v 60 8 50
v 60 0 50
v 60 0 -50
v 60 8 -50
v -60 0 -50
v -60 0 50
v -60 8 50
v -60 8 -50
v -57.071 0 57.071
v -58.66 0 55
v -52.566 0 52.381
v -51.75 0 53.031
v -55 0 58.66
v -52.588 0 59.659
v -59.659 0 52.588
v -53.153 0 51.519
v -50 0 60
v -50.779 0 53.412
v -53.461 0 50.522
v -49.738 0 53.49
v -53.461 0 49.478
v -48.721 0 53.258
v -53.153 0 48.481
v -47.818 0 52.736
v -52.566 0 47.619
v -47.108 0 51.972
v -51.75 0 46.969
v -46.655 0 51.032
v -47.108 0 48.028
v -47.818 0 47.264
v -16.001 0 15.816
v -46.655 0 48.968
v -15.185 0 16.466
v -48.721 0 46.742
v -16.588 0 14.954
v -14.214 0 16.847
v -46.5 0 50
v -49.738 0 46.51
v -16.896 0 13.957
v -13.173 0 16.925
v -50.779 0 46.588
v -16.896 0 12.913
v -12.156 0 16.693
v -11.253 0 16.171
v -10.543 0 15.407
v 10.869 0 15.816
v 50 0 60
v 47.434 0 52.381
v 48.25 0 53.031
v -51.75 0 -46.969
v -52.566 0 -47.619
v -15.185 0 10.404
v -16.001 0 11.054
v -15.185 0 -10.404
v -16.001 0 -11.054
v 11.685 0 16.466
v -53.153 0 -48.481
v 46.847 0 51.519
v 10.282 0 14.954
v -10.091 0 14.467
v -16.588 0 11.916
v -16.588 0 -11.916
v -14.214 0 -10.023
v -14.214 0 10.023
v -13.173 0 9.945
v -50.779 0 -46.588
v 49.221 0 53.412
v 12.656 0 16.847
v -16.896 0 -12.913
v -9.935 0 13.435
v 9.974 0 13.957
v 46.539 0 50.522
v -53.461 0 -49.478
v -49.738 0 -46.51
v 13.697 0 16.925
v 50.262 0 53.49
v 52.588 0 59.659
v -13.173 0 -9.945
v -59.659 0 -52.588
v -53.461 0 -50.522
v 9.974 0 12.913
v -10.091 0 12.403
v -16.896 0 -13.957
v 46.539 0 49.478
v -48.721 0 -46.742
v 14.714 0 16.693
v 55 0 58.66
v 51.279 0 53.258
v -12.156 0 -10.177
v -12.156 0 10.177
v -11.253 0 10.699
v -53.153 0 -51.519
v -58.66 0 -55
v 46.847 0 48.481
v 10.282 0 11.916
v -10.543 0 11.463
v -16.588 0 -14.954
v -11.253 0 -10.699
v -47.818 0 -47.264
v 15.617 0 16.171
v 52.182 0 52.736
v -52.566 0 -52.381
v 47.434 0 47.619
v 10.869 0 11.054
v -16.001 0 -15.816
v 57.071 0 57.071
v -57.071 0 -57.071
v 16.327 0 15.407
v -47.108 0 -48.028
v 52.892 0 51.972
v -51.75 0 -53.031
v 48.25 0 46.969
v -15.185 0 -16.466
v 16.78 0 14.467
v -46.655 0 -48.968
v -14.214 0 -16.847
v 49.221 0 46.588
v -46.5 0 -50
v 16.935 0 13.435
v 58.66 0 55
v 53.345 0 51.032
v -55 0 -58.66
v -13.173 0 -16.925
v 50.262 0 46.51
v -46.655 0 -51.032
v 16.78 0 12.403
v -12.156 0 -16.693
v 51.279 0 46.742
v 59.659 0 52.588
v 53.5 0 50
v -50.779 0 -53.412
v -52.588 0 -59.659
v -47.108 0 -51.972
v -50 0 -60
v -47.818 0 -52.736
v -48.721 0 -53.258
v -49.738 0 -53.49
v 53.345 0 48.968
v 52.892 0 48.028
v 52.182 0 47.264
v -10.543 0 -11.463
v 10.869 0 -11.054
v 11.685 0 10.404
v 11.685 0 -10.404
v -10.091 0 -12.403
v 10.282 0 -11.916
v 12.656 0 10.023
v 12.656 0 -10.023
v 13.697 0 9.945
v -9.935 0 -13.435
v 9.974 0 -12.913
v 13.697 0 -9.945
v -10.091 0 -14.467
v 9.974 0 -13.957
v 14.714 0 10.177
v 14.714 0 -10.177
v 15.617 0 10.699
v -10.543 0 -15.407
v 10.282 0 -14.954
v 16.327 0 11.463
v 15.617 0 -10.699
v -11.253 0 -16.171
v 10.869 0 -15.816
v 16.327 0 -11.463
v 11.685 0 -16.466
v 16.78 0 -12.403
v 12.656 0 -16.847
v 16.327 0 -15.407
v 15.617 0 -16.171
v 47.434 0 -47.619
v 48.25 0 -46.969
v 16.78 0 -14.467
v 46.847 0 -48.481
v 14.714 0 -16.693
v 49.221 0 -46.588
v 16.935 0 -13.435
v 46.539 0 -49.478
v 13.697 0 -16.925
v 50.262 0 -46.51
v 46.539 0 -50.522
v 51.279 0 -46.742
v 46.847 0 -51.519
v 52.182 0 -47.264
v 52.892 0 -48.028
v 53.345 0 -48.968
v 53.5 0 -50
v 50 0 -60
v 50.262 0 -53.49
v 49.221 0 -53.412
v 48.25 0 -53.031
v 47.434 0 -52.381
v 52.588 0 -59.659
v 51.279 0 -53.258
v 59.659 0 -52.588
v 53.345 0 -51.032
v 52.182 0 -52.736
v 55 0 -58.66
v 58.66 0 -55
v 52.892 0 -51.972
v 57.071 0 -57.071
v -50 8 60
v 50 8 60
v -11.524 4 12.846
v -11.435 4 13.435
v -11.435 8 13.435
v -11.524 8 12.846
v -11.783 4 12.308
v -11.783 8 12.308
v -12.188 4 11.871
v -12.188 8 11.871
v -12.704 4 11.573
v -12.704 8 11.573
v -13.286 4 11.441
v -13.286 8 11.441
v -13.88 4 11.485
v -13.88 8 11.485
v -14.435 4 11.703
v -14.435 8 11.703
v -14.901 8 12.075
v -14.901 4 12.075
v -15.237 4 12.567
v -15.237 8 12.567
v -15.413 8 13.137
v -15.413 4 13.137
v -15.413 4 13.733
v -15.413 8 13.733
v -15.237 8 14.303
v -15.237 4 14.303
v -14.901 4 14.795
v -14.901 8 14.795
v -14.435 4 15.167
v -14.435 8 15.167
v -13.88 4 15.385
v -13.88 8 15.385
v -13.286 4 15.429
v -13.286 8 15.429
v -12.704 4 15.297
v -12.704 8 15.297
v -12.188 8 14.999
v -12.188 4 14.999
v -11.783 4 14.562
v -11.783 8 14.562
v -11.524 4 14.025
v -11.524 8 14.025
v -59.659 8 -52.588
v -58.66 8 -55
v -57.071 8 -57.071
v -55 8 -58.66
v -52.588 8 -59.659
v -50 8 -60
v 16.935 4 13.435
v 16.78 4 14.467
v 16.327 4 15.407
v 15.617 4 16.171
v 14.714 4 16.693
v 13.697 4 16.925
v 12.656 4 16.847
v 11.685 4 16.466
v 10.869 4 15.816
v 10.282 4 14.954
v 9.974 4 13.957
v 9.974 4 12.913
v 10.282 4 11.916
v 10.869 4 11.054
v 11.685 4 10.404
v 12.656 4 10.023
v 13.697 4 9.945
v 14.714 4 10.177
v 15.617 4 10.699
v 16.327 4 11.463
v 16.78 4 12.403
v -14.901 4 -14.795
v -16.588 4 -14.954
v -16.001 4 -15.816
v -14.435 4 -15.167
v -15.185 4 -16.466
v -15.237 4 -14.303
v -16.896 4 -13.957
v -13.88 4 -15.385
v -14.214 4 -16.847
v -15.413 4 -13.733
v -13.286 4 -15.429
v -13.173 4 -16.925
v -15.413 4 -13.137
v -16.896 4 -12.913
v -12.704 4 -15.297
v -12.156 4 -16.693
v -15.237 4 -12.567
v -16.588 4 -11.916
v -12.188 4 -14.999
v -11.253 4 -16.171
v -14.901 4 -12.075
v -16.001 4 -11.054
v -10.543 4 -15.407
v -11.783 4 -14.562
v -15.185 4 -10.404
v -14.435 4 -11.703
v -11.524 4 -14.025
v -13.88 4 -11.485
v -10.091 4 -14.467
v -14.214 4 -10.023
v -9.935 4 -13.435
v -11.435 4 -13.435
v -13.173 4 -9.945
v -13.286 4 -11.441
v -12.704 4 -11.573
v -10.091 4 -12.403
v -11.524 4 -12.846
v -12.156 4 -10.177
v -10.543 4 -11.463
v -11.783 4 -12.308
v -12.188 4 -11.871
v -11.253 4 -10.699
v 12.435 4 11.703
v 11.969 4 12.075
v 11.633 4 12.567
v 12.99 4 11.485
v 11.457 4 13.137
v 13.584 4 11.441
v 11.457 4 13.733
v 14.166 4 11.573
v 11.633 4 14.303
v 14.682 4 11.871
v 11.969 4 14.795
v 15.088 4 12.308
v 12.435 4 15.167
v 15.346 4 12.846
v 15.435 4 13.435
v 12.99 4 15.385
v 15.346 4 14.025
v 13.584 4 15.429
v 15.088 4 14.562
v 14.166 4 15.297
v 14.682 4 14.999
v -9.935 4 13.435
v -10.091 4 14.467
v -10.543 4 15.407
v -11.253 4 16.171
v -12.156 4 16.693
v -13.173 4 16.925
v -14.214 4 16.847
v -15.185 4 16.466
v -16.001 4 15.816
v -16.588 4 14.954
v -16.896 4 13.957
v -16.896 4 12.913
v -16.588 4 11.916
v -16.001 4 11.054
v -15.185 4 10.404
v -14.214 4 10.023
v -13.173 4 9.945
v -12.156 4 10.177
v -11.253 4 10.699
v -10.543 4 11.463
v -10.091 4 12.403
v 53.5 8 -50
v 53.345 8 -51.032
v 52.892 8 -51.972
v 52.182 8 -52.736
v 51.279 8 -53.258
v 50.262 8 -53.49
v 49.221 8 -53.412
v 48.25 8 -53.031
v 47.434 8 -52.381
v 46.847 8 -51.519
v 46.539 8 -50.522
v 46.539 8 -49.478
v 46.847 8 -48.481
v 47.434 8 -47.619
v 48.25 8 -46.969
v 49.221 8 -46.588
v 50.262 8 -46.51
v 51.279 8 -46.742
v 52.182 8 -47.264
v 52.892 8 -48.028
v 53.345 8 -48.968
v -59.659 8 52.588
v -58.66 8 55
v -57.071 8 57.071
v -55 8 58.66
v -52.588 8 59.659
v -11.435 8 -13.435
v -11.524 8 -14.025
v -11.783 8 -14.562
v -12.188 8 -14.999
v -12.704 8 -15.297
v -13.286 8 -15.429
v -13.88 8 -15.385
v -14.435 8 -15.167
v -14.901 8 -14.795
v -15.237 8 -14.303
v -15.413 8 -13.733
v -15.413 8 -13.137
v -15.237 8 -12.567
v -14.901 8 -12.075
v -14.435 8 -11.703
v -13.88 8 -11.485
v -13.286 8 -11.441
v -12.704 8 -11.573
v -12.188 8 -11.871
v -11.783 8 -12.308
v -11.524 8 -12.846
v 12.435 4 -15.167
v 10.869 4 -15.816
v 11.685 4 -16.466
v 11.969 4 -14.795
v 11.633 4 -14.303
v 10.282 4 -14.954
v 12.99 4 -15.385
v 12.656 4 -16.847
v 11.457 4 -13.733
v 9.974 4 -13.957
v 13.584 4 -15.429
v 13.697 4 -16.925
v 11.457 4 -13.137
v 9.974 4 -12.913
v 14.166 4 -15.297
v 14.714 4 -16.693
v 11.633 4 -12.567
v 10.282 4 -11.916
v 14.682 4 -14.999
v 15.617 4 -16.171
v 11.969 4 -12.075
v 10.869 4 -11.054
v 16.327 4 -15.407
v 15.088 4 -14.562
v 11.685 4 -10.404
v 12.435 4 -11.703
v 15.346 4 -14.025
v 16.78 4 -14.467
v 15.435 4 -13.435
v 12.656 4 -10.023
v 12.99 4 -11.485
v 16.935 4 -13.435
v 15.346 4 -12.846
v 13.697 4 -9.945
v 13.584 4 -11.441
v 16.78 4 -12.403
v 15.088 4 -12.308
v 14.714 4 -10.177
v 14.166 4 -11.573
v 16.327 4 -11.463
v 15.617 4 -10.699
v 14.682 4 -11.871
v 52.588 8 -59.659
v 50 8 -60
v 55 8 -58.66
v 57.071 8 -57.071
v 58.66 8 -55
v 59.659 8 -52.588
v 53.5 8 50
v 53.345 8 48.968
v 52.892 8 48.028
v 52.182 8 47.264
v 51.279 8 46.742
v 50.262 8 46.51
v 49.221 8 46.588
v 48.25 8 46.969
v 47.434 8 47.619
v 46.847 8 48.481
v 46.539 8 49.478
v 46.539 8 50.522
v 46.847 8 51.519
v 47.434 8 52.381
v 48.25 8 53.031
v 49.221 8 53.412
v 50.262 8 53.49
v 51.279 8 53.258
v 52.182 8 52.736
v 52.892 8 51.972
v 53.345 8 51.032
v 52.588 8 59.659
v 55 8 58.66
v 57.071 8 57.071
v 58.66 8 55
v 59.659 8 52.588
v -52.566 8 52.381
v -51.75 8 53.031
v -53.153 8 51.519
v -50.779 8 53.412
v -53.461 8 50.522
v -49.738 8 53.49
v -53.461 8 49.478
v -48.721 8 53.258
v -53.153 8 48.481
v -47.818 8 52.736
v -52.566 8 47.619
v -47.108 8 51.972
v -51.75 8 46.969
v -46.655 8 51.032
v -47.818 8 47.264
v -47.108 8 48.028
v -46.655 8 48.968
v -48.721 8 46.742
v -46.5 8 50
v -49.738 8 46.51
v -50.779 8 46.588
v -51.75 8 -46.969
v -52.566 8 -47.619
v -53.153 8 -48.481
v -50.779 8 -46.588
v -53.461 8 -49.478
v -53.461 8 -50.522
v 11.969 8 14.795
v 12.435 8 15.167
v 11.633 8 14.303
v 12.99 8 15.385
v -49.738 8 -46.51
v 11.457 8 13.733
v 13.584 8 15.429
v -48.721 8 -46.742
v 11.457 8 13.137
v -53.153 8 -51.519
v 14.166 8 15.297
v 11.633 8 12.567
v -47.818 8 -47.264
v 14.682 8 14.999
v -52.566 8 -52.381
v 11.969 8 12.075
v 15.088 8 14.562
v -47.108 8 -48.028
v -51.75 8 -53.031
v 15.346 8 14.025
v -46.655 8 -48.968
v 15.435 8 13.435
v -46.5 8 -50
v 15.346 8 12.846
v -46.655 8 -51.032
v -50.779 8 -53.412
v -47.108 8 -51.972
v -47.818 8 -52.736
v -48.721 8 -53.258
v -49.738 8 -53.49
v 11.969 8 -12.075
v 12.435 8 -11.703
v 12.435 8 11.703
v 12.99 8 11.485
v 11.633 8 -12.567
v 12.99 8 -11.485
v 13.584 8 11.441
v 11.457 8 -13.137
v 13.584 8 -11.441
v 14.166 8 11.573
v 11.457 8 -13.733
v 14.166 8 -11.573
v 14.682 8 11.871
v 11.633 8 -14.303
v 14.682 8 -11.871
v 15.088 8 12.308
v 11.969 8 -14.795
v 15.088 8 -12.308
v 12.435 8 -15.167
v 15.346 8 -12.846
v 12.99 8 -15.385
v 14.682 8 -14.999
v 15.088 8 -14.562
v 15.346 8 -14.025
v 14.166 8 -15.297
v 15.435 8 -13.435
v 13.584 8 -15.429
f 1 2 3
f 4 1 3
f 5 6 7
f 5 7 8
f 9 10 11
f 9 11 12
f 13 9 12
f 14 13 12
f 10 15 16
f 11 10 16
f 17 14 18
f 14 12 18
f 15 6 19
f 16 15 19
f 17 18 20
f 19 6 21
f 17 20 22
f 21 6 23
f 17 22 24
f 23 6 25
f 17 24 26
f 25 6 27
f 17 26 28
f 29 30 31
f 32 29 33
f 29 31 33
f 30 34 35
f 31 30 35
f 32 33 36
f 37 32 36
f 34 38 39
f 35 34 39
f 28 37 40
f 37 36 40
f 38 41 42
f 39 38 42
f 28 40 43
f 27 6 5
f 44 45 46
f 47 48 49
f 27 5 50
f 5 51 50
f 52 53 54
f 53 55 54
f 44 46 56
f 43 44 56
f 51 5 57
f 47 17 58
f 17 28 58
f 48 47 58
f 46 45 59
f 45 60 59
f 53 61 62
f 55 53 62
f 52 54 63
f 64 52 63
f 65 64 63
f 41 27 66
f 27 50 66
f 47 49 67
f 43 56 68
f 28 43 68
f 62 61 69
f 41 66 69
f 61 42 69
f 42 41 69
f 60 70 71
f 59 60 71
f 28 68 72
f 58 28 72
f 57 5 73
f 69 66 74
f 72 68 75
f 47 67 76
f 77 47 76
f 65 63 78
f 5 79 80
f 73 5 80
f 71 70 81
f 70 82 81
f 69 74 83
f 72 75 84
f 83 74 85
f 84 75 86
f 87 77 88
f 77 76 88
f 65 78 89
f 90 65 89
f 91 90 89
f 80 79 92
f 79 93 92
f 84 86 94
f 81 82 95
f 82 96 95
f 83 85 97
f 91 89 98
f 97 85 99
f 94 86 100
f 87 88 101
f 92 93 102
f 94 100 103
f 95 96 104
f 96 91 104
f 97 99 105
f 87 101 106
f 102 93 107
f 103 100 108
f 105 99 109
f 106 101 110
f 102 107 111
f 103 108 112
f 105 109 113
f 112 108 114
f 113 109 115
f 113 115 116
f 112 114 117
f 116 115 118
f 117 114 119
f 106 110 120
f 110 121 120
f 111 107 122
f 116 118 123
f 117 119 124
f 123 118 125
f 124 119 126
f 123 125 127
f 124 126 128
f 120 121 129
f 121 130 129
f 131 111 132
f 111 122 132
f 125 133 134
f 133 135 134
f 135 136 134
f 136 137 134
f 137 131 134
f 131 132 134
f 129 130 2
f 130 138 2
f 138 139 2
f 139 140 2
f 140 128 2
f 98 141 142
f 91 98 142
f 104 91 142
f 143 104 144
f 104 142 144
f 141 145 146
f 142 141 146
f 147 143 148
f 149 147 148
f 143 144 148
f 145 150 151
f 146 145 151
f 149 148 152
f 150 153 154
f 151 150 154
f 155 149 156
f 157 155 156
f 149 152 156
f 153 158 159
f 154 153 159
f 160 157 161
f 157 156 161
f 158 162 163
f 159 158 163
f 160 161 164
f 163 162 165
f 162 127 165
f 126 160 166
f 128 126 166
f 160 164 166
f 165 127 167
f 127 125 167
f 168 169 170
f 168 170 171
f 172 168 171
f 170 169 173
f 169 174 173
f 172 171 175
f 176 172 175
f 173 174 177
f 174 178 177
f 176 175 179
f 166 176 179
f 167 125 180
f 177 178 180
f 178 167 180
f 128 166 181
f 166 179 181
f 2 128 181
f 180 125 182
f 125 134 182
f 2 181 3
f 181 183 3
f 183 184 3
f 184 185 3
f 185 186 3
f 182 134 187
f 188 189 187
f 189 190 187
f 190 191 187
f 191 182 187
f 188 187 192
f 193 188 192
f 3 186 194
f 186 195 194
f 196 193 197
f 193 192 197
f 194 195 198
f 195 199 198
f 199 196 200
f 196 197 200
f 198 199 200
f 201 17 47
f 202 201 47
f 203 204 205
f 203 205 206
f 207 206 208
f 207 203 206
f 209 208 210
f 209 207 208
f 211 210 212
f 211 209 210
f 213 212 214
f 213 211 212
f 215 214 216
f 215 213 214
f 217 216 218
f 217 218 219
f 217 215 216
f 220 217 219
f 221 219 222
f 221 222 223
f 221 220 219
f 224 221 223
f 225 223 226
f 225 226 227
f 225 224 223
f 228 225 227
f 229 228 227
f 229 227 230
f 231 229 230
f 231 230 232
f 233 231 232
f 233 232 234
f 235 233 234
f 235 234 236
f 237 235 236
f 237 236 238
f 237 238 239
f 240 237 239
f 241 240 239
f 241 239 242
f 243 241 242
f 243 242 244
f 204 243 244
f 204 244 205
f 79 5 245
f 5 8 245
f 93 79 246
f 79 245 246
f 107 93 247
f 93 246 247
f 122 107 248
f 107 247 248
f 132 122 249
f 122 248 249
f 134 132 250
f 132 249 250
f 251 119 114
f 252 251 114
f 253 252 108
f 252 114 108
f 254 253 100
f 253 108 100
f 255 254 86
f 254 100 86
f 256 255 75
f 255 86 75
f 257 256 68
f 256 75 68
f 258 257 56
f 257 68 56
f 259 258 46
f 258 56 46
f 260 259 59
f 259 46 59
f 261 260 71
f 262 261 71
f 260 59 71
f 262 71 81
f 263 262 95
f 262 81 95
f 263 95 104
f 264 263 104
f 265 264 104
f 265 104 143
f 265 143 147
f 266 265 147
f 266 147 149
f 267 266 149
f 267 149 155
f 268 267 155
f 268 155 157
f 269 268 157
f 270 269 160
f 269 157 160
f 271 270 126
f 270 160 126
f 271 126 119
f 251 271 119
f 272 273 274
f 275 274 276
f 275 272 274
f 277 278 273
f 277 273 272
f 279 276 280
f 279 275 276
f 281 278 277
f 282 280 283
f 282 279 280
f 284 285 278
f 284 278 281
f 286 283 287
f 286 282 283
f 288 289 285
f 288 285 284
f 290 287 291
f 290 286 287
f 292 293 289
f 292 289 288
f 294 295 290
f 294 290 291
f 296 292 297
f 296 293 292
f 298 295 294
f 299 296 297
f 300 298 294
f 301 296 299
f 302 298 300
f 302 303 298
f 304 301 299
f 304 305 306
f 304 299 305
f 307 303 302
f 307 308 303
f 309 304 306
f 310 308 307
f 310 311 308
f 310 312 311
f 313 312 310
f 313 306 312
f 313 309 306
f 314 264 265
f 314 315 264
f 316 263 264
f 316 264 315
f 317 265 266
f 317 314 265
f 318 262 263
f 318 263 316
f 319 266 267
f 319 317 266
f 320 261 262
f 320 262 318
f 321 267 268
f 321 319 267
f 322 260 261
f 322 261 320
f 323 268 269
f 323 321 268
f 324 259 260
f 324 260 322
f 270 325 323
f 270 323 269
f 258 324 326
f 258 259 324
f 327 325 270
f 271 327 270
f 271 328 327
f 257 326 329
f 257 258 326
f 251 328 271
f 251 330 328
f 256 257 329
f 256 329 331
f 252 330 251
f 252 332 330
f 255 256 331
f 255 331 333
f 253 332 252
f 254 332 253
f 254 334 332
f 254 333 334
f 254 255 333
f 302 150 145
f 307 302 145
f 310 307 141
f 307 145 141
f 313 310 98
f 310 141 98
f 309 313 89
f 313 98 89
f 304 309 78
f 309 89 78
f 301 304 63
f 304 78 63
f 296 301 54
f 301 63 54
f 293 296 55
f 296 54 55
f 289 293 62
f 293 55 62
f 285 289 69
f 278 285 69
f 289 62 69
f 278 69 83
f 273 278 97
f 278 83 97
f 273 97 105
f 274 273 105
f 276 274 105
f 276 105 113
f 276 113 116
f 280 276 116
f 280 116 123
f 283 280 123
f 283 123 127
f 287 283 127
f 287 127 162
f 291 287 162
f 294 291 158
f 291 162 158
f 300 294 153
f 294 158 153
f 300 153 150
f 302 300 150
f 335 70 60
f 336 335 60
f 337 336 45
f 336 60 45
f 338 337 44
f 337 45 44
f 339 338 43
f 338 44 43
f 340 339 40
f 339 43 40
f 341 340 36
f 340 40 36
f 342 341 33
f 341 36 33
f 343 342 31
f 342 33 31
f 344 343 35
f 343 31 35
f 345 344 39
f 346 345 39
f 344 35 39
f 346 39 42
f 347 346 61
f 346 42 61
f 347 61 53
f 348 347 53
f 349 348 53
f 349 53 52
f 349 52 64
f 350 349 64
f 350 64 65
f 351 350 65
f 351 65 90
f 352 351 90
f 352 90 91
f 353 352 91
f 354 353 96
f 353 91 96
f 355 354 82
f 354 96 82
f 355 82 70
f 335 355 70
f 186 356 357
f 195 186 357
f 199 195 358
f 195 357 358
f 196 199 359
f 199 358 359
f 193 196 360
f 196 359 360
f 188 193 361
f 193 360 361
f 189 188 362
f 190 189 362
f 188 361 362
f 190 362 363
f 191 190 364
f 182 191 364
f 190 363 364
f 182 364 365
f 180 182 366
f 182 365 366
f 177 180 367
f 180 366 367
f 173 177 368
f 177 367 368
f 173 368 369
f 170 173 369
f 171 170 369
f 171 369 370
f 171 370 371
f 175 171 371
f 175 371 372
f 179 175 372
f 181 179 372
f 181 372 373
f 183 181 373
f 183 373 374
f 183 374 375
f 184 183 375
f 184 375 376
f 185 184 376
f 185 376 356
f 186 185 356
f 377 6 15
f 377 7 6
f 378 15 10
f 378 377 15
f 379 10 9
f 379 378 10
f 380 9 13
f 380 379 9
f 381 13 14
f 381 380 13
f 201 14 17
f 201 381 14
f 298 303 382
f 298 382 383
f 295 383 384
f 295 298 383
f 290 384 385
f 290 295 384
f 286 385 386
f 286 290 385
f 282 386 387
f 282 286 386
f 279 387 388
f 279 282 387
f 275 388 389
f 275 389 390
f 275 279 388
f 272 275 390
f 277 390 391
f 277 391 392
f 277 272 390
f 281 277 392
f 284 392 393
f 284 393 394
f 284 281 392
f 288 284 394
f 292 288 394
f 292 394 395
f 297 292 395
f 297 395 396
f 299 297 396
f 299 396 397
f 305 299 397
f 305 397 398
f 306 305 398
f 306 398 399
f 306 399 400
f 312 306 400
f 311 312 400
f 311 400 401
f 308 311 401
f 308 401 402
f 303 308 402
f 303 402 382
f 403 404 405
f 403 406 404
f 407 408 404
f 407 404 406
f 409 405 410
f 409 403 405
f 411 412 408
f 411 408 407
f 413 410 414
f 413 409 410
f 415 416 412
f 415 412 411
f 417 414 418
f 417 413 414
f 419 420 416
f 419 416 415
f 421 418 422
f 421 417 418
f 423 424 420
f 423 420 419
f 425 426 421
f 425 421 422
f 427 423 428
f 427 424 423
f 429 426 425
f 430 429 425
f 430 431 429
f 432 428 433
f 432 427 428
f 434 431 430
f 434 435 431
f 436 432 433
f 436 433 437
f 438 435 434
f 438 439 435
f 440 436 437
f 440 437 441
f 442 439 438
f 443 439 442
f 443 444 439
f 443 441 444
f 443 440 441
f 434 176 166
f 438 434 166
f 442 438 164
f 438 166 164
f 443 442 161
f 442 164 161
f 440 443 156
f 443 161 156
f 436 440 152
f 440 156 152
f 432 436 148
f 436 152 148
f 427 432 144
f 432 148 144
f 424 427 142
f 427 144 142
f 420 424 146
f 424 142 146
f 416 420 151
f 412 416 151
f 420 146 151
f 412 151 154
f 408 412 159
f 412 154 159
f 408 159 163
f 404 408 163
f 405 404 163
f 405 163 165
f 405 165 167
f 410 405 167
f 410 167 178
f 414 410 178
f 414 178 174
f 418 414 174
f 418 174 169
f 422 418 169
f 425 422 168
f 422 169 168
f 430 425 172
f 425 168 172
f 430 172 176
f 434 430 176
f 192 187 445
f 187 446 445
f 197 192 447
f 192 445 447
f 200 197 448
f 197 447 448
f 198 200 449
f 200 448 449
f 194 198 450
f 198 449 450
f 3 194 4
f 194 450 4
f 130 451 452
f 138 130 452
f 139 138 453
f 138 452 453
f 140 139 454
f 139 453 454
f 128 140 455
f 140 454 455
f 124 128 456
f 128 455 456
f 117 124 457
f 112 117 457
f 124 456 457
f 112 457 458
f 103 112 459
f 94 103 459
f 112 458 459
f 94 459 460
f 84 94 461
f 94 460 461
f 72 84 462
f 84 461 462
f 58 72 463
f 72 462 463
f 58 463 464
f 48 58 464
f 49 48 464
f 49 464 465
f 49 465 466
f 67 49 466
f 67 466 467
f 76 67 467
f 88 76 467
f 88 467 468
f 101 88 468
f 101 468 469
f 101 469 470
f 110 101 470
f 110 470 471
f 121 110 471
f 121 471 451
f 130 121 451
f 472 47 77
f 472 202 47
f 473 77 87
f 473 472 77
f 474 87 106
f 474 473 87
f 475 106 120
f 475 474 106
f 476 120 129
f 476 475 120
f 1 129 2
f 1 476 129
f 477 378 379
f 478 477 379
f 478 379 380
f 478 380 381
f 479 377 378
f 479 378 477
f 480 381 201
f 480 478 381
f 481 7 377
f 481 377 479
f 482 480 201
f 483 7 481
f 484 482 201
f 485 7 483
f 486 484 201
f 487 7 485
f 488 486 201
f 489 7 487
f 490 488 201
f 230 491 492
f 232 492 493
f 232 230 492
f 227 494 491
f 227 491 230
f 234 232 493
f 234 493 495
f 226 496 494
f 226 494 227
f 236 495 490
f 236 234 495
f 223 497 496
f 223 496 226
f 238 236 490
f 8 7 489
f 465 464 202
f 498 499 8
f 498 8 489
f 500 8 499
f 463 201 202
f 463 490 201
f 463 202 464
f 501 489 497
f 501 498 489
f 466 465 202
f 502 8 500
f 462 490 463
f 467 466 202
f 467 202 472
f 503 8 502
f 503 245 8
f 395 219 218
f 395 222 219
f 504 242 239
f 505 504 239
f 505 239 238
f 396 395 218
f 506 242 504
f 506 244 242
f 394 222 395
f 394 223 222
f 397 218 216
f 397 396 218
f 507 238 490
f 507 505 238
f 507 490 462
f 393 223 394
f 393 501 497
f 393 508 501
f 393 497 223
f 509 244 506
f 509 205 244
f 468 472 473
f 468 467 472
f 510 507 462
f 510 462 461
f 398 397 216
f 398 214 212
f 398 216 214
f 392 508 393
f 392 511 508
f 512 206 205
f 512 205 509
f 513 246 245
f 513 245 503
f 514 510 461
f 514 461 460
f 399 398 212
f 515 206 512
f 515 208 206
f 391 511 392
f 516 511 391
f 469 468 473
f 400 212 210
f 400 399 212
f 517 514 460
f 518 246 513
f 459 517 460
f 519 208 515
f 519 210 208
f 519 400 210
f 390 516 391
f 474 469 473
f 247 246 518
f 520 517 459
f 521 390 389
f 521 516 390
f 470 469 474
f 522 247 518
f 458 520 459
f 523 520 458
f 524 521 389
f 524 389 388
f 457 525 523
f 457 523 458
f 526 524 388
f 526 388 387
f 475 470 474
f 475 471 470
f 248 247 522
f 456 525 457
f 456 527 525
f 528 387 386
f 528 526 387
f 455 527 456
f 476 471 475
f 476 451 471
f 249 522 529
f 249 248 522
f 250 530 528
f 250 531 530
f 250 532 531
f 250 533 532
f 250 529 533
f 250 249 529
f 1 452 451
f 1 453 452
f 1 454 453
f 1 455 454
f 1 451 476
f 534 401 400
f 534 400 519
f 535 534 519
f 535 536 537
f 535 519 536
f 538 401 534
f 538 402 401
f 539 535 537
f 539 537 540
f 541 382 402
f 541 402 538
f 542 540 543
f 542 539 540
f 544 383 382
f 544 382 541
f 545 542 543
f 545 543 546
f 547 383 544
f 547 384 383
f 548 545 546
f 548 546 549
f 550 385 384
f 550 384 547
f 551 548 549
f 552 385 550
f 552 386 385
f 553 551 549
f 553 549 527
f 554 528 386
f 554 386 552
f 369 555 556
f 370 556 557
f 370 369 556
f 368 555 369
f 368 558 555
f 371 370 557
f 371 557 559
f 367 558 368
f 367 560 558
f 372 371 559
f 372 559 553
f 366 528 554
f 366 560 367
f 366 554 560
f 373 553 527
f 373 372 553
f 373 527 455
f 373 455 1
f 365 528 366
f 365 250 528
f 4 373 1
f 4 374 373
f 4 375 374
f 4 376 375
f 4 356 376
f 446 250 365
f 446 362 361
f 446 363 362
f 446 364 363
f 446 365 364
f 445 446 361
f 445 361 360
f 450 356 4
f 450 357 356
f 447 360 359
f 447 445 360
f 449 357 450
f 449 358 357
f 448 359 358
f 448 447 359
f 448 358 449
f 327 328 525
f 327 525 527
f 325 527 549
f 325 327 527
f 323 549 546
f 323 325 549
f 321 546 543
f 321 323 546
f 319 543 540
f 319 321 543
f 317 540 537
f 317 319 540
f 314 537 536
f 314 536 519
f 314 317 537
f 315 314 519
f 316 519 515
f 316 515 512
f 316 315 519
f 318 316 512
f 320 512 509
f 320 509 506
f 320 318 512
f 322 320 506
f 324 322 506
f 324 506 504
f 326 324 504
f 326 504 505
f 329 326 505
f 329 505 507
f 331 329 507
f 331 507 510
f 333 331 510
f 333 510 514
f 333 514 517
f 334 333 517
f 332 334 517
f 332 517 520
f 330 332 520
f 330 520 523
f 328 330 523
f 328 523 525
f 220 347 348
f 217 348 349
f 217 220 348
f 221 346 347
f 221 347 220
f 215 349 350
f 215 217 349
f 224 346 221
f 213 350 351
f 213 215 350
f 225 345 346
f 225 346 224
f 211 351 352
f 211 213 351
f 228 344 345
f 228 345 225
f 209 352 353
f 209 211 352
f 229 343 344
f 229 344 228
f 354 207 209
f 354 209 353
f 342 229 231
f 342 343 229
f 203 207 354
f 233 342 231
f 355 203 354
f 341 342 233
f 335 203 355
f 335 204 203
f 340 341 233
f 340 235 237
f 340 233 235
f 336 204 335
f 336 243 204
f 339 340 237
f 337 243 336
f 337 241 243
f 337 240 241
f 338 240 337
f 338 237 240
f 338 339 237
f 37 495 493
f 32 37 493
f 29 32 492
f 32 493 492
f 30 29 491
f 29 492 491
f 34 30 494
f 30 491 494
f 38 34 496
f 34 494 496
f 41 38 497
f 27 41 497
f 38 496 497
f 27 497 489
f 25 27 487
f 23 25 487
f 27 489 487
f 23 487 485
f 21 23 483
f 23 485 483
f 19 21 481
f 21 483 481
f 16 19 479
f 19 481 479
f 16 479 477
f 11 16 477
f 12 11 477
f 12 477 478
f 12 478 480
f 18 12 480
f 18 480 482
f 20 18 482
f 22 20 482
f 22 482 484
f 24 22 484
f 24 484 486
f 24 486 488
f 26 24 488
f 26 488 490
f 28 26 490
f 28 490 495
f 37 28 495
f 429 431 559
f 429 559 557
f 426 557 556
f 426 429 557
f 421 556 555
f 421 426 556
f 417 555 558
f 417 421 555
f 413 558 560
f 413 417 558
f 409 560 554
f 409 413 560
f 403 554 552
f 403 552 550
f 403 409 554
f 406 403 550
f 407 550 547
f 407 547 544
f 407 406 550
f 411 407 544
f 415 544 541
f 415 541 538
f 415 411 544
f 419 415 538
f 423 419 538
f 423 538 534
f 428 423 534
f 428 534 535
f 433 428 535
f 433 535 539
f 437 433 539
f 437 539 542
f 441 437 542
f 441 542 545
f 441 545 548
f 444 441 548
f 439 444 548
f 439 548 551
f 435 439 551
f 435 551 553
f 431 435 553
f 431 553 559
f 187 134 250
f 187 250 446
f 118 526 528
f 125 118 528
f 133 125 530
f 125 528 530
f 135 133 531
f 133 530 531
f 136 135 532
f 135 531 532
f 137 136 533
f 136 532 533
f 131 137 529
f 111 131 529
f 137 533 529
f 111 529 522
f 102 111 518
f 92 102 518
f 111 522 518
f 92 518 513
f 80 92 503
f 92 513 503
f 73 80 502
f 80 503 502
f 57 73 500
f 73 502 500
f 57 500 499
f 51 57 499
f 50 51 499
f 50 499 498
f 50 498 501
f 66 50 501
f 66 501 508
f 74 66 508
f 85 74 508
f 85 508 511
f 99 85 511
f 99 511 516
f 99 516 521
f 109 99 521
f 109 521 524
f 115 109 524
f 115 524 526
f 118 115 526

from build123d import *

# Parameters (mm, degrees)
SKETCH_1_W          = 120
SKETCH_1_H          = 120
SKETCH_1_R          = 2
EXTRUDE_1_DEPTH     = 8
SKETCH_2_R          = 3.5
CUT_EXTRUDE_1_DEPTH = 10
SKETCH_3_R          = 3.5
CUT_EXTRUDE_2_DEPTH = 4
FILLET_1_R          = 10


with BuildPart() as part:
    # 草图1 → 凸台-拉伸1 (new body)
    with BuildSketch(Plane(origin=(0, 0, 0), x_dir=(1, 0, 0), z_dir=(0, 1, 0))):
        Rectangle(SKETCH_1_W, SKETCH_1_H)
        with Locations((-13.435028843, 13.435028843)):
            Circle(SKETCH_1_R, mode=Mode.SUBTRACT)
        with Locations((13.435028843, 13.435028843)):
            Circle(SKETCH_1_R, mode=Mode.SUBTRACT)
        with Locations((13.435028843, -13.435028843)):
            Circle(SKETCH_1_R, mode=Mode.SUBTRACT)
        with Locations((-13.435028843, -13.435028843)):
            Circle(SKETCH_1_R, mode=Mode.SUBTRACT)
    extrude(amount=EXTRUDE_1_DEPTH)

    # 草图2 → 切除-拉伸1 (cut)
    with BuildSketch(Plane(origin=(0, 8, 0), x_dir=(1, 0, 0), z_dir=(0, 1, 0))):
        with Locations((-50, 50)):
            Circle(SKETCH_2_R)
        with Locations((50, 50)):
            Circle(SKETCH_2_R)
        with Locations((50, -50)):
            Circle(SKETCH_2_R)
        with Locations((-50, -50)):
            Circle(SKETCH_2_R)
    extrude(amount=-CUT_EXTRUDE_1_DEPTH, mode=Mode.SUBTRACT)

    # 草图3 → 切除-拉伸2 (cut)
    with BuildSketch(Plane.XZ):
        with Locations((-13.435028843, 13.435028843)):
            Circle(SKETCH_3_R)
        with Locations((13.435028843, 13.435028843)):
            Circle(SKETCH_3_R)
        with Locations((-13.435028843, -13.435028843)):
            Circle(SKETCH_3_R)
        with Locations((13.435028843, -13.435028843)):
            Circle(SKETCH_3_R)
    extrude(amount=-CUT_EXTRUDE_2_DEPTH, mode=Mode.SUBTRACT)

    # 圆角1
    fillet_1_edges = [part.edges().sort_by_distance(p)[0] for p in [
        (60, 4, 60),
        (-60, 4, 60),
        (-60, 4, -60),
        (60, 4, -60),
    ]]
    fillet(fillet_1_edges, radius=FILLET_1_R)


solid = part.part
